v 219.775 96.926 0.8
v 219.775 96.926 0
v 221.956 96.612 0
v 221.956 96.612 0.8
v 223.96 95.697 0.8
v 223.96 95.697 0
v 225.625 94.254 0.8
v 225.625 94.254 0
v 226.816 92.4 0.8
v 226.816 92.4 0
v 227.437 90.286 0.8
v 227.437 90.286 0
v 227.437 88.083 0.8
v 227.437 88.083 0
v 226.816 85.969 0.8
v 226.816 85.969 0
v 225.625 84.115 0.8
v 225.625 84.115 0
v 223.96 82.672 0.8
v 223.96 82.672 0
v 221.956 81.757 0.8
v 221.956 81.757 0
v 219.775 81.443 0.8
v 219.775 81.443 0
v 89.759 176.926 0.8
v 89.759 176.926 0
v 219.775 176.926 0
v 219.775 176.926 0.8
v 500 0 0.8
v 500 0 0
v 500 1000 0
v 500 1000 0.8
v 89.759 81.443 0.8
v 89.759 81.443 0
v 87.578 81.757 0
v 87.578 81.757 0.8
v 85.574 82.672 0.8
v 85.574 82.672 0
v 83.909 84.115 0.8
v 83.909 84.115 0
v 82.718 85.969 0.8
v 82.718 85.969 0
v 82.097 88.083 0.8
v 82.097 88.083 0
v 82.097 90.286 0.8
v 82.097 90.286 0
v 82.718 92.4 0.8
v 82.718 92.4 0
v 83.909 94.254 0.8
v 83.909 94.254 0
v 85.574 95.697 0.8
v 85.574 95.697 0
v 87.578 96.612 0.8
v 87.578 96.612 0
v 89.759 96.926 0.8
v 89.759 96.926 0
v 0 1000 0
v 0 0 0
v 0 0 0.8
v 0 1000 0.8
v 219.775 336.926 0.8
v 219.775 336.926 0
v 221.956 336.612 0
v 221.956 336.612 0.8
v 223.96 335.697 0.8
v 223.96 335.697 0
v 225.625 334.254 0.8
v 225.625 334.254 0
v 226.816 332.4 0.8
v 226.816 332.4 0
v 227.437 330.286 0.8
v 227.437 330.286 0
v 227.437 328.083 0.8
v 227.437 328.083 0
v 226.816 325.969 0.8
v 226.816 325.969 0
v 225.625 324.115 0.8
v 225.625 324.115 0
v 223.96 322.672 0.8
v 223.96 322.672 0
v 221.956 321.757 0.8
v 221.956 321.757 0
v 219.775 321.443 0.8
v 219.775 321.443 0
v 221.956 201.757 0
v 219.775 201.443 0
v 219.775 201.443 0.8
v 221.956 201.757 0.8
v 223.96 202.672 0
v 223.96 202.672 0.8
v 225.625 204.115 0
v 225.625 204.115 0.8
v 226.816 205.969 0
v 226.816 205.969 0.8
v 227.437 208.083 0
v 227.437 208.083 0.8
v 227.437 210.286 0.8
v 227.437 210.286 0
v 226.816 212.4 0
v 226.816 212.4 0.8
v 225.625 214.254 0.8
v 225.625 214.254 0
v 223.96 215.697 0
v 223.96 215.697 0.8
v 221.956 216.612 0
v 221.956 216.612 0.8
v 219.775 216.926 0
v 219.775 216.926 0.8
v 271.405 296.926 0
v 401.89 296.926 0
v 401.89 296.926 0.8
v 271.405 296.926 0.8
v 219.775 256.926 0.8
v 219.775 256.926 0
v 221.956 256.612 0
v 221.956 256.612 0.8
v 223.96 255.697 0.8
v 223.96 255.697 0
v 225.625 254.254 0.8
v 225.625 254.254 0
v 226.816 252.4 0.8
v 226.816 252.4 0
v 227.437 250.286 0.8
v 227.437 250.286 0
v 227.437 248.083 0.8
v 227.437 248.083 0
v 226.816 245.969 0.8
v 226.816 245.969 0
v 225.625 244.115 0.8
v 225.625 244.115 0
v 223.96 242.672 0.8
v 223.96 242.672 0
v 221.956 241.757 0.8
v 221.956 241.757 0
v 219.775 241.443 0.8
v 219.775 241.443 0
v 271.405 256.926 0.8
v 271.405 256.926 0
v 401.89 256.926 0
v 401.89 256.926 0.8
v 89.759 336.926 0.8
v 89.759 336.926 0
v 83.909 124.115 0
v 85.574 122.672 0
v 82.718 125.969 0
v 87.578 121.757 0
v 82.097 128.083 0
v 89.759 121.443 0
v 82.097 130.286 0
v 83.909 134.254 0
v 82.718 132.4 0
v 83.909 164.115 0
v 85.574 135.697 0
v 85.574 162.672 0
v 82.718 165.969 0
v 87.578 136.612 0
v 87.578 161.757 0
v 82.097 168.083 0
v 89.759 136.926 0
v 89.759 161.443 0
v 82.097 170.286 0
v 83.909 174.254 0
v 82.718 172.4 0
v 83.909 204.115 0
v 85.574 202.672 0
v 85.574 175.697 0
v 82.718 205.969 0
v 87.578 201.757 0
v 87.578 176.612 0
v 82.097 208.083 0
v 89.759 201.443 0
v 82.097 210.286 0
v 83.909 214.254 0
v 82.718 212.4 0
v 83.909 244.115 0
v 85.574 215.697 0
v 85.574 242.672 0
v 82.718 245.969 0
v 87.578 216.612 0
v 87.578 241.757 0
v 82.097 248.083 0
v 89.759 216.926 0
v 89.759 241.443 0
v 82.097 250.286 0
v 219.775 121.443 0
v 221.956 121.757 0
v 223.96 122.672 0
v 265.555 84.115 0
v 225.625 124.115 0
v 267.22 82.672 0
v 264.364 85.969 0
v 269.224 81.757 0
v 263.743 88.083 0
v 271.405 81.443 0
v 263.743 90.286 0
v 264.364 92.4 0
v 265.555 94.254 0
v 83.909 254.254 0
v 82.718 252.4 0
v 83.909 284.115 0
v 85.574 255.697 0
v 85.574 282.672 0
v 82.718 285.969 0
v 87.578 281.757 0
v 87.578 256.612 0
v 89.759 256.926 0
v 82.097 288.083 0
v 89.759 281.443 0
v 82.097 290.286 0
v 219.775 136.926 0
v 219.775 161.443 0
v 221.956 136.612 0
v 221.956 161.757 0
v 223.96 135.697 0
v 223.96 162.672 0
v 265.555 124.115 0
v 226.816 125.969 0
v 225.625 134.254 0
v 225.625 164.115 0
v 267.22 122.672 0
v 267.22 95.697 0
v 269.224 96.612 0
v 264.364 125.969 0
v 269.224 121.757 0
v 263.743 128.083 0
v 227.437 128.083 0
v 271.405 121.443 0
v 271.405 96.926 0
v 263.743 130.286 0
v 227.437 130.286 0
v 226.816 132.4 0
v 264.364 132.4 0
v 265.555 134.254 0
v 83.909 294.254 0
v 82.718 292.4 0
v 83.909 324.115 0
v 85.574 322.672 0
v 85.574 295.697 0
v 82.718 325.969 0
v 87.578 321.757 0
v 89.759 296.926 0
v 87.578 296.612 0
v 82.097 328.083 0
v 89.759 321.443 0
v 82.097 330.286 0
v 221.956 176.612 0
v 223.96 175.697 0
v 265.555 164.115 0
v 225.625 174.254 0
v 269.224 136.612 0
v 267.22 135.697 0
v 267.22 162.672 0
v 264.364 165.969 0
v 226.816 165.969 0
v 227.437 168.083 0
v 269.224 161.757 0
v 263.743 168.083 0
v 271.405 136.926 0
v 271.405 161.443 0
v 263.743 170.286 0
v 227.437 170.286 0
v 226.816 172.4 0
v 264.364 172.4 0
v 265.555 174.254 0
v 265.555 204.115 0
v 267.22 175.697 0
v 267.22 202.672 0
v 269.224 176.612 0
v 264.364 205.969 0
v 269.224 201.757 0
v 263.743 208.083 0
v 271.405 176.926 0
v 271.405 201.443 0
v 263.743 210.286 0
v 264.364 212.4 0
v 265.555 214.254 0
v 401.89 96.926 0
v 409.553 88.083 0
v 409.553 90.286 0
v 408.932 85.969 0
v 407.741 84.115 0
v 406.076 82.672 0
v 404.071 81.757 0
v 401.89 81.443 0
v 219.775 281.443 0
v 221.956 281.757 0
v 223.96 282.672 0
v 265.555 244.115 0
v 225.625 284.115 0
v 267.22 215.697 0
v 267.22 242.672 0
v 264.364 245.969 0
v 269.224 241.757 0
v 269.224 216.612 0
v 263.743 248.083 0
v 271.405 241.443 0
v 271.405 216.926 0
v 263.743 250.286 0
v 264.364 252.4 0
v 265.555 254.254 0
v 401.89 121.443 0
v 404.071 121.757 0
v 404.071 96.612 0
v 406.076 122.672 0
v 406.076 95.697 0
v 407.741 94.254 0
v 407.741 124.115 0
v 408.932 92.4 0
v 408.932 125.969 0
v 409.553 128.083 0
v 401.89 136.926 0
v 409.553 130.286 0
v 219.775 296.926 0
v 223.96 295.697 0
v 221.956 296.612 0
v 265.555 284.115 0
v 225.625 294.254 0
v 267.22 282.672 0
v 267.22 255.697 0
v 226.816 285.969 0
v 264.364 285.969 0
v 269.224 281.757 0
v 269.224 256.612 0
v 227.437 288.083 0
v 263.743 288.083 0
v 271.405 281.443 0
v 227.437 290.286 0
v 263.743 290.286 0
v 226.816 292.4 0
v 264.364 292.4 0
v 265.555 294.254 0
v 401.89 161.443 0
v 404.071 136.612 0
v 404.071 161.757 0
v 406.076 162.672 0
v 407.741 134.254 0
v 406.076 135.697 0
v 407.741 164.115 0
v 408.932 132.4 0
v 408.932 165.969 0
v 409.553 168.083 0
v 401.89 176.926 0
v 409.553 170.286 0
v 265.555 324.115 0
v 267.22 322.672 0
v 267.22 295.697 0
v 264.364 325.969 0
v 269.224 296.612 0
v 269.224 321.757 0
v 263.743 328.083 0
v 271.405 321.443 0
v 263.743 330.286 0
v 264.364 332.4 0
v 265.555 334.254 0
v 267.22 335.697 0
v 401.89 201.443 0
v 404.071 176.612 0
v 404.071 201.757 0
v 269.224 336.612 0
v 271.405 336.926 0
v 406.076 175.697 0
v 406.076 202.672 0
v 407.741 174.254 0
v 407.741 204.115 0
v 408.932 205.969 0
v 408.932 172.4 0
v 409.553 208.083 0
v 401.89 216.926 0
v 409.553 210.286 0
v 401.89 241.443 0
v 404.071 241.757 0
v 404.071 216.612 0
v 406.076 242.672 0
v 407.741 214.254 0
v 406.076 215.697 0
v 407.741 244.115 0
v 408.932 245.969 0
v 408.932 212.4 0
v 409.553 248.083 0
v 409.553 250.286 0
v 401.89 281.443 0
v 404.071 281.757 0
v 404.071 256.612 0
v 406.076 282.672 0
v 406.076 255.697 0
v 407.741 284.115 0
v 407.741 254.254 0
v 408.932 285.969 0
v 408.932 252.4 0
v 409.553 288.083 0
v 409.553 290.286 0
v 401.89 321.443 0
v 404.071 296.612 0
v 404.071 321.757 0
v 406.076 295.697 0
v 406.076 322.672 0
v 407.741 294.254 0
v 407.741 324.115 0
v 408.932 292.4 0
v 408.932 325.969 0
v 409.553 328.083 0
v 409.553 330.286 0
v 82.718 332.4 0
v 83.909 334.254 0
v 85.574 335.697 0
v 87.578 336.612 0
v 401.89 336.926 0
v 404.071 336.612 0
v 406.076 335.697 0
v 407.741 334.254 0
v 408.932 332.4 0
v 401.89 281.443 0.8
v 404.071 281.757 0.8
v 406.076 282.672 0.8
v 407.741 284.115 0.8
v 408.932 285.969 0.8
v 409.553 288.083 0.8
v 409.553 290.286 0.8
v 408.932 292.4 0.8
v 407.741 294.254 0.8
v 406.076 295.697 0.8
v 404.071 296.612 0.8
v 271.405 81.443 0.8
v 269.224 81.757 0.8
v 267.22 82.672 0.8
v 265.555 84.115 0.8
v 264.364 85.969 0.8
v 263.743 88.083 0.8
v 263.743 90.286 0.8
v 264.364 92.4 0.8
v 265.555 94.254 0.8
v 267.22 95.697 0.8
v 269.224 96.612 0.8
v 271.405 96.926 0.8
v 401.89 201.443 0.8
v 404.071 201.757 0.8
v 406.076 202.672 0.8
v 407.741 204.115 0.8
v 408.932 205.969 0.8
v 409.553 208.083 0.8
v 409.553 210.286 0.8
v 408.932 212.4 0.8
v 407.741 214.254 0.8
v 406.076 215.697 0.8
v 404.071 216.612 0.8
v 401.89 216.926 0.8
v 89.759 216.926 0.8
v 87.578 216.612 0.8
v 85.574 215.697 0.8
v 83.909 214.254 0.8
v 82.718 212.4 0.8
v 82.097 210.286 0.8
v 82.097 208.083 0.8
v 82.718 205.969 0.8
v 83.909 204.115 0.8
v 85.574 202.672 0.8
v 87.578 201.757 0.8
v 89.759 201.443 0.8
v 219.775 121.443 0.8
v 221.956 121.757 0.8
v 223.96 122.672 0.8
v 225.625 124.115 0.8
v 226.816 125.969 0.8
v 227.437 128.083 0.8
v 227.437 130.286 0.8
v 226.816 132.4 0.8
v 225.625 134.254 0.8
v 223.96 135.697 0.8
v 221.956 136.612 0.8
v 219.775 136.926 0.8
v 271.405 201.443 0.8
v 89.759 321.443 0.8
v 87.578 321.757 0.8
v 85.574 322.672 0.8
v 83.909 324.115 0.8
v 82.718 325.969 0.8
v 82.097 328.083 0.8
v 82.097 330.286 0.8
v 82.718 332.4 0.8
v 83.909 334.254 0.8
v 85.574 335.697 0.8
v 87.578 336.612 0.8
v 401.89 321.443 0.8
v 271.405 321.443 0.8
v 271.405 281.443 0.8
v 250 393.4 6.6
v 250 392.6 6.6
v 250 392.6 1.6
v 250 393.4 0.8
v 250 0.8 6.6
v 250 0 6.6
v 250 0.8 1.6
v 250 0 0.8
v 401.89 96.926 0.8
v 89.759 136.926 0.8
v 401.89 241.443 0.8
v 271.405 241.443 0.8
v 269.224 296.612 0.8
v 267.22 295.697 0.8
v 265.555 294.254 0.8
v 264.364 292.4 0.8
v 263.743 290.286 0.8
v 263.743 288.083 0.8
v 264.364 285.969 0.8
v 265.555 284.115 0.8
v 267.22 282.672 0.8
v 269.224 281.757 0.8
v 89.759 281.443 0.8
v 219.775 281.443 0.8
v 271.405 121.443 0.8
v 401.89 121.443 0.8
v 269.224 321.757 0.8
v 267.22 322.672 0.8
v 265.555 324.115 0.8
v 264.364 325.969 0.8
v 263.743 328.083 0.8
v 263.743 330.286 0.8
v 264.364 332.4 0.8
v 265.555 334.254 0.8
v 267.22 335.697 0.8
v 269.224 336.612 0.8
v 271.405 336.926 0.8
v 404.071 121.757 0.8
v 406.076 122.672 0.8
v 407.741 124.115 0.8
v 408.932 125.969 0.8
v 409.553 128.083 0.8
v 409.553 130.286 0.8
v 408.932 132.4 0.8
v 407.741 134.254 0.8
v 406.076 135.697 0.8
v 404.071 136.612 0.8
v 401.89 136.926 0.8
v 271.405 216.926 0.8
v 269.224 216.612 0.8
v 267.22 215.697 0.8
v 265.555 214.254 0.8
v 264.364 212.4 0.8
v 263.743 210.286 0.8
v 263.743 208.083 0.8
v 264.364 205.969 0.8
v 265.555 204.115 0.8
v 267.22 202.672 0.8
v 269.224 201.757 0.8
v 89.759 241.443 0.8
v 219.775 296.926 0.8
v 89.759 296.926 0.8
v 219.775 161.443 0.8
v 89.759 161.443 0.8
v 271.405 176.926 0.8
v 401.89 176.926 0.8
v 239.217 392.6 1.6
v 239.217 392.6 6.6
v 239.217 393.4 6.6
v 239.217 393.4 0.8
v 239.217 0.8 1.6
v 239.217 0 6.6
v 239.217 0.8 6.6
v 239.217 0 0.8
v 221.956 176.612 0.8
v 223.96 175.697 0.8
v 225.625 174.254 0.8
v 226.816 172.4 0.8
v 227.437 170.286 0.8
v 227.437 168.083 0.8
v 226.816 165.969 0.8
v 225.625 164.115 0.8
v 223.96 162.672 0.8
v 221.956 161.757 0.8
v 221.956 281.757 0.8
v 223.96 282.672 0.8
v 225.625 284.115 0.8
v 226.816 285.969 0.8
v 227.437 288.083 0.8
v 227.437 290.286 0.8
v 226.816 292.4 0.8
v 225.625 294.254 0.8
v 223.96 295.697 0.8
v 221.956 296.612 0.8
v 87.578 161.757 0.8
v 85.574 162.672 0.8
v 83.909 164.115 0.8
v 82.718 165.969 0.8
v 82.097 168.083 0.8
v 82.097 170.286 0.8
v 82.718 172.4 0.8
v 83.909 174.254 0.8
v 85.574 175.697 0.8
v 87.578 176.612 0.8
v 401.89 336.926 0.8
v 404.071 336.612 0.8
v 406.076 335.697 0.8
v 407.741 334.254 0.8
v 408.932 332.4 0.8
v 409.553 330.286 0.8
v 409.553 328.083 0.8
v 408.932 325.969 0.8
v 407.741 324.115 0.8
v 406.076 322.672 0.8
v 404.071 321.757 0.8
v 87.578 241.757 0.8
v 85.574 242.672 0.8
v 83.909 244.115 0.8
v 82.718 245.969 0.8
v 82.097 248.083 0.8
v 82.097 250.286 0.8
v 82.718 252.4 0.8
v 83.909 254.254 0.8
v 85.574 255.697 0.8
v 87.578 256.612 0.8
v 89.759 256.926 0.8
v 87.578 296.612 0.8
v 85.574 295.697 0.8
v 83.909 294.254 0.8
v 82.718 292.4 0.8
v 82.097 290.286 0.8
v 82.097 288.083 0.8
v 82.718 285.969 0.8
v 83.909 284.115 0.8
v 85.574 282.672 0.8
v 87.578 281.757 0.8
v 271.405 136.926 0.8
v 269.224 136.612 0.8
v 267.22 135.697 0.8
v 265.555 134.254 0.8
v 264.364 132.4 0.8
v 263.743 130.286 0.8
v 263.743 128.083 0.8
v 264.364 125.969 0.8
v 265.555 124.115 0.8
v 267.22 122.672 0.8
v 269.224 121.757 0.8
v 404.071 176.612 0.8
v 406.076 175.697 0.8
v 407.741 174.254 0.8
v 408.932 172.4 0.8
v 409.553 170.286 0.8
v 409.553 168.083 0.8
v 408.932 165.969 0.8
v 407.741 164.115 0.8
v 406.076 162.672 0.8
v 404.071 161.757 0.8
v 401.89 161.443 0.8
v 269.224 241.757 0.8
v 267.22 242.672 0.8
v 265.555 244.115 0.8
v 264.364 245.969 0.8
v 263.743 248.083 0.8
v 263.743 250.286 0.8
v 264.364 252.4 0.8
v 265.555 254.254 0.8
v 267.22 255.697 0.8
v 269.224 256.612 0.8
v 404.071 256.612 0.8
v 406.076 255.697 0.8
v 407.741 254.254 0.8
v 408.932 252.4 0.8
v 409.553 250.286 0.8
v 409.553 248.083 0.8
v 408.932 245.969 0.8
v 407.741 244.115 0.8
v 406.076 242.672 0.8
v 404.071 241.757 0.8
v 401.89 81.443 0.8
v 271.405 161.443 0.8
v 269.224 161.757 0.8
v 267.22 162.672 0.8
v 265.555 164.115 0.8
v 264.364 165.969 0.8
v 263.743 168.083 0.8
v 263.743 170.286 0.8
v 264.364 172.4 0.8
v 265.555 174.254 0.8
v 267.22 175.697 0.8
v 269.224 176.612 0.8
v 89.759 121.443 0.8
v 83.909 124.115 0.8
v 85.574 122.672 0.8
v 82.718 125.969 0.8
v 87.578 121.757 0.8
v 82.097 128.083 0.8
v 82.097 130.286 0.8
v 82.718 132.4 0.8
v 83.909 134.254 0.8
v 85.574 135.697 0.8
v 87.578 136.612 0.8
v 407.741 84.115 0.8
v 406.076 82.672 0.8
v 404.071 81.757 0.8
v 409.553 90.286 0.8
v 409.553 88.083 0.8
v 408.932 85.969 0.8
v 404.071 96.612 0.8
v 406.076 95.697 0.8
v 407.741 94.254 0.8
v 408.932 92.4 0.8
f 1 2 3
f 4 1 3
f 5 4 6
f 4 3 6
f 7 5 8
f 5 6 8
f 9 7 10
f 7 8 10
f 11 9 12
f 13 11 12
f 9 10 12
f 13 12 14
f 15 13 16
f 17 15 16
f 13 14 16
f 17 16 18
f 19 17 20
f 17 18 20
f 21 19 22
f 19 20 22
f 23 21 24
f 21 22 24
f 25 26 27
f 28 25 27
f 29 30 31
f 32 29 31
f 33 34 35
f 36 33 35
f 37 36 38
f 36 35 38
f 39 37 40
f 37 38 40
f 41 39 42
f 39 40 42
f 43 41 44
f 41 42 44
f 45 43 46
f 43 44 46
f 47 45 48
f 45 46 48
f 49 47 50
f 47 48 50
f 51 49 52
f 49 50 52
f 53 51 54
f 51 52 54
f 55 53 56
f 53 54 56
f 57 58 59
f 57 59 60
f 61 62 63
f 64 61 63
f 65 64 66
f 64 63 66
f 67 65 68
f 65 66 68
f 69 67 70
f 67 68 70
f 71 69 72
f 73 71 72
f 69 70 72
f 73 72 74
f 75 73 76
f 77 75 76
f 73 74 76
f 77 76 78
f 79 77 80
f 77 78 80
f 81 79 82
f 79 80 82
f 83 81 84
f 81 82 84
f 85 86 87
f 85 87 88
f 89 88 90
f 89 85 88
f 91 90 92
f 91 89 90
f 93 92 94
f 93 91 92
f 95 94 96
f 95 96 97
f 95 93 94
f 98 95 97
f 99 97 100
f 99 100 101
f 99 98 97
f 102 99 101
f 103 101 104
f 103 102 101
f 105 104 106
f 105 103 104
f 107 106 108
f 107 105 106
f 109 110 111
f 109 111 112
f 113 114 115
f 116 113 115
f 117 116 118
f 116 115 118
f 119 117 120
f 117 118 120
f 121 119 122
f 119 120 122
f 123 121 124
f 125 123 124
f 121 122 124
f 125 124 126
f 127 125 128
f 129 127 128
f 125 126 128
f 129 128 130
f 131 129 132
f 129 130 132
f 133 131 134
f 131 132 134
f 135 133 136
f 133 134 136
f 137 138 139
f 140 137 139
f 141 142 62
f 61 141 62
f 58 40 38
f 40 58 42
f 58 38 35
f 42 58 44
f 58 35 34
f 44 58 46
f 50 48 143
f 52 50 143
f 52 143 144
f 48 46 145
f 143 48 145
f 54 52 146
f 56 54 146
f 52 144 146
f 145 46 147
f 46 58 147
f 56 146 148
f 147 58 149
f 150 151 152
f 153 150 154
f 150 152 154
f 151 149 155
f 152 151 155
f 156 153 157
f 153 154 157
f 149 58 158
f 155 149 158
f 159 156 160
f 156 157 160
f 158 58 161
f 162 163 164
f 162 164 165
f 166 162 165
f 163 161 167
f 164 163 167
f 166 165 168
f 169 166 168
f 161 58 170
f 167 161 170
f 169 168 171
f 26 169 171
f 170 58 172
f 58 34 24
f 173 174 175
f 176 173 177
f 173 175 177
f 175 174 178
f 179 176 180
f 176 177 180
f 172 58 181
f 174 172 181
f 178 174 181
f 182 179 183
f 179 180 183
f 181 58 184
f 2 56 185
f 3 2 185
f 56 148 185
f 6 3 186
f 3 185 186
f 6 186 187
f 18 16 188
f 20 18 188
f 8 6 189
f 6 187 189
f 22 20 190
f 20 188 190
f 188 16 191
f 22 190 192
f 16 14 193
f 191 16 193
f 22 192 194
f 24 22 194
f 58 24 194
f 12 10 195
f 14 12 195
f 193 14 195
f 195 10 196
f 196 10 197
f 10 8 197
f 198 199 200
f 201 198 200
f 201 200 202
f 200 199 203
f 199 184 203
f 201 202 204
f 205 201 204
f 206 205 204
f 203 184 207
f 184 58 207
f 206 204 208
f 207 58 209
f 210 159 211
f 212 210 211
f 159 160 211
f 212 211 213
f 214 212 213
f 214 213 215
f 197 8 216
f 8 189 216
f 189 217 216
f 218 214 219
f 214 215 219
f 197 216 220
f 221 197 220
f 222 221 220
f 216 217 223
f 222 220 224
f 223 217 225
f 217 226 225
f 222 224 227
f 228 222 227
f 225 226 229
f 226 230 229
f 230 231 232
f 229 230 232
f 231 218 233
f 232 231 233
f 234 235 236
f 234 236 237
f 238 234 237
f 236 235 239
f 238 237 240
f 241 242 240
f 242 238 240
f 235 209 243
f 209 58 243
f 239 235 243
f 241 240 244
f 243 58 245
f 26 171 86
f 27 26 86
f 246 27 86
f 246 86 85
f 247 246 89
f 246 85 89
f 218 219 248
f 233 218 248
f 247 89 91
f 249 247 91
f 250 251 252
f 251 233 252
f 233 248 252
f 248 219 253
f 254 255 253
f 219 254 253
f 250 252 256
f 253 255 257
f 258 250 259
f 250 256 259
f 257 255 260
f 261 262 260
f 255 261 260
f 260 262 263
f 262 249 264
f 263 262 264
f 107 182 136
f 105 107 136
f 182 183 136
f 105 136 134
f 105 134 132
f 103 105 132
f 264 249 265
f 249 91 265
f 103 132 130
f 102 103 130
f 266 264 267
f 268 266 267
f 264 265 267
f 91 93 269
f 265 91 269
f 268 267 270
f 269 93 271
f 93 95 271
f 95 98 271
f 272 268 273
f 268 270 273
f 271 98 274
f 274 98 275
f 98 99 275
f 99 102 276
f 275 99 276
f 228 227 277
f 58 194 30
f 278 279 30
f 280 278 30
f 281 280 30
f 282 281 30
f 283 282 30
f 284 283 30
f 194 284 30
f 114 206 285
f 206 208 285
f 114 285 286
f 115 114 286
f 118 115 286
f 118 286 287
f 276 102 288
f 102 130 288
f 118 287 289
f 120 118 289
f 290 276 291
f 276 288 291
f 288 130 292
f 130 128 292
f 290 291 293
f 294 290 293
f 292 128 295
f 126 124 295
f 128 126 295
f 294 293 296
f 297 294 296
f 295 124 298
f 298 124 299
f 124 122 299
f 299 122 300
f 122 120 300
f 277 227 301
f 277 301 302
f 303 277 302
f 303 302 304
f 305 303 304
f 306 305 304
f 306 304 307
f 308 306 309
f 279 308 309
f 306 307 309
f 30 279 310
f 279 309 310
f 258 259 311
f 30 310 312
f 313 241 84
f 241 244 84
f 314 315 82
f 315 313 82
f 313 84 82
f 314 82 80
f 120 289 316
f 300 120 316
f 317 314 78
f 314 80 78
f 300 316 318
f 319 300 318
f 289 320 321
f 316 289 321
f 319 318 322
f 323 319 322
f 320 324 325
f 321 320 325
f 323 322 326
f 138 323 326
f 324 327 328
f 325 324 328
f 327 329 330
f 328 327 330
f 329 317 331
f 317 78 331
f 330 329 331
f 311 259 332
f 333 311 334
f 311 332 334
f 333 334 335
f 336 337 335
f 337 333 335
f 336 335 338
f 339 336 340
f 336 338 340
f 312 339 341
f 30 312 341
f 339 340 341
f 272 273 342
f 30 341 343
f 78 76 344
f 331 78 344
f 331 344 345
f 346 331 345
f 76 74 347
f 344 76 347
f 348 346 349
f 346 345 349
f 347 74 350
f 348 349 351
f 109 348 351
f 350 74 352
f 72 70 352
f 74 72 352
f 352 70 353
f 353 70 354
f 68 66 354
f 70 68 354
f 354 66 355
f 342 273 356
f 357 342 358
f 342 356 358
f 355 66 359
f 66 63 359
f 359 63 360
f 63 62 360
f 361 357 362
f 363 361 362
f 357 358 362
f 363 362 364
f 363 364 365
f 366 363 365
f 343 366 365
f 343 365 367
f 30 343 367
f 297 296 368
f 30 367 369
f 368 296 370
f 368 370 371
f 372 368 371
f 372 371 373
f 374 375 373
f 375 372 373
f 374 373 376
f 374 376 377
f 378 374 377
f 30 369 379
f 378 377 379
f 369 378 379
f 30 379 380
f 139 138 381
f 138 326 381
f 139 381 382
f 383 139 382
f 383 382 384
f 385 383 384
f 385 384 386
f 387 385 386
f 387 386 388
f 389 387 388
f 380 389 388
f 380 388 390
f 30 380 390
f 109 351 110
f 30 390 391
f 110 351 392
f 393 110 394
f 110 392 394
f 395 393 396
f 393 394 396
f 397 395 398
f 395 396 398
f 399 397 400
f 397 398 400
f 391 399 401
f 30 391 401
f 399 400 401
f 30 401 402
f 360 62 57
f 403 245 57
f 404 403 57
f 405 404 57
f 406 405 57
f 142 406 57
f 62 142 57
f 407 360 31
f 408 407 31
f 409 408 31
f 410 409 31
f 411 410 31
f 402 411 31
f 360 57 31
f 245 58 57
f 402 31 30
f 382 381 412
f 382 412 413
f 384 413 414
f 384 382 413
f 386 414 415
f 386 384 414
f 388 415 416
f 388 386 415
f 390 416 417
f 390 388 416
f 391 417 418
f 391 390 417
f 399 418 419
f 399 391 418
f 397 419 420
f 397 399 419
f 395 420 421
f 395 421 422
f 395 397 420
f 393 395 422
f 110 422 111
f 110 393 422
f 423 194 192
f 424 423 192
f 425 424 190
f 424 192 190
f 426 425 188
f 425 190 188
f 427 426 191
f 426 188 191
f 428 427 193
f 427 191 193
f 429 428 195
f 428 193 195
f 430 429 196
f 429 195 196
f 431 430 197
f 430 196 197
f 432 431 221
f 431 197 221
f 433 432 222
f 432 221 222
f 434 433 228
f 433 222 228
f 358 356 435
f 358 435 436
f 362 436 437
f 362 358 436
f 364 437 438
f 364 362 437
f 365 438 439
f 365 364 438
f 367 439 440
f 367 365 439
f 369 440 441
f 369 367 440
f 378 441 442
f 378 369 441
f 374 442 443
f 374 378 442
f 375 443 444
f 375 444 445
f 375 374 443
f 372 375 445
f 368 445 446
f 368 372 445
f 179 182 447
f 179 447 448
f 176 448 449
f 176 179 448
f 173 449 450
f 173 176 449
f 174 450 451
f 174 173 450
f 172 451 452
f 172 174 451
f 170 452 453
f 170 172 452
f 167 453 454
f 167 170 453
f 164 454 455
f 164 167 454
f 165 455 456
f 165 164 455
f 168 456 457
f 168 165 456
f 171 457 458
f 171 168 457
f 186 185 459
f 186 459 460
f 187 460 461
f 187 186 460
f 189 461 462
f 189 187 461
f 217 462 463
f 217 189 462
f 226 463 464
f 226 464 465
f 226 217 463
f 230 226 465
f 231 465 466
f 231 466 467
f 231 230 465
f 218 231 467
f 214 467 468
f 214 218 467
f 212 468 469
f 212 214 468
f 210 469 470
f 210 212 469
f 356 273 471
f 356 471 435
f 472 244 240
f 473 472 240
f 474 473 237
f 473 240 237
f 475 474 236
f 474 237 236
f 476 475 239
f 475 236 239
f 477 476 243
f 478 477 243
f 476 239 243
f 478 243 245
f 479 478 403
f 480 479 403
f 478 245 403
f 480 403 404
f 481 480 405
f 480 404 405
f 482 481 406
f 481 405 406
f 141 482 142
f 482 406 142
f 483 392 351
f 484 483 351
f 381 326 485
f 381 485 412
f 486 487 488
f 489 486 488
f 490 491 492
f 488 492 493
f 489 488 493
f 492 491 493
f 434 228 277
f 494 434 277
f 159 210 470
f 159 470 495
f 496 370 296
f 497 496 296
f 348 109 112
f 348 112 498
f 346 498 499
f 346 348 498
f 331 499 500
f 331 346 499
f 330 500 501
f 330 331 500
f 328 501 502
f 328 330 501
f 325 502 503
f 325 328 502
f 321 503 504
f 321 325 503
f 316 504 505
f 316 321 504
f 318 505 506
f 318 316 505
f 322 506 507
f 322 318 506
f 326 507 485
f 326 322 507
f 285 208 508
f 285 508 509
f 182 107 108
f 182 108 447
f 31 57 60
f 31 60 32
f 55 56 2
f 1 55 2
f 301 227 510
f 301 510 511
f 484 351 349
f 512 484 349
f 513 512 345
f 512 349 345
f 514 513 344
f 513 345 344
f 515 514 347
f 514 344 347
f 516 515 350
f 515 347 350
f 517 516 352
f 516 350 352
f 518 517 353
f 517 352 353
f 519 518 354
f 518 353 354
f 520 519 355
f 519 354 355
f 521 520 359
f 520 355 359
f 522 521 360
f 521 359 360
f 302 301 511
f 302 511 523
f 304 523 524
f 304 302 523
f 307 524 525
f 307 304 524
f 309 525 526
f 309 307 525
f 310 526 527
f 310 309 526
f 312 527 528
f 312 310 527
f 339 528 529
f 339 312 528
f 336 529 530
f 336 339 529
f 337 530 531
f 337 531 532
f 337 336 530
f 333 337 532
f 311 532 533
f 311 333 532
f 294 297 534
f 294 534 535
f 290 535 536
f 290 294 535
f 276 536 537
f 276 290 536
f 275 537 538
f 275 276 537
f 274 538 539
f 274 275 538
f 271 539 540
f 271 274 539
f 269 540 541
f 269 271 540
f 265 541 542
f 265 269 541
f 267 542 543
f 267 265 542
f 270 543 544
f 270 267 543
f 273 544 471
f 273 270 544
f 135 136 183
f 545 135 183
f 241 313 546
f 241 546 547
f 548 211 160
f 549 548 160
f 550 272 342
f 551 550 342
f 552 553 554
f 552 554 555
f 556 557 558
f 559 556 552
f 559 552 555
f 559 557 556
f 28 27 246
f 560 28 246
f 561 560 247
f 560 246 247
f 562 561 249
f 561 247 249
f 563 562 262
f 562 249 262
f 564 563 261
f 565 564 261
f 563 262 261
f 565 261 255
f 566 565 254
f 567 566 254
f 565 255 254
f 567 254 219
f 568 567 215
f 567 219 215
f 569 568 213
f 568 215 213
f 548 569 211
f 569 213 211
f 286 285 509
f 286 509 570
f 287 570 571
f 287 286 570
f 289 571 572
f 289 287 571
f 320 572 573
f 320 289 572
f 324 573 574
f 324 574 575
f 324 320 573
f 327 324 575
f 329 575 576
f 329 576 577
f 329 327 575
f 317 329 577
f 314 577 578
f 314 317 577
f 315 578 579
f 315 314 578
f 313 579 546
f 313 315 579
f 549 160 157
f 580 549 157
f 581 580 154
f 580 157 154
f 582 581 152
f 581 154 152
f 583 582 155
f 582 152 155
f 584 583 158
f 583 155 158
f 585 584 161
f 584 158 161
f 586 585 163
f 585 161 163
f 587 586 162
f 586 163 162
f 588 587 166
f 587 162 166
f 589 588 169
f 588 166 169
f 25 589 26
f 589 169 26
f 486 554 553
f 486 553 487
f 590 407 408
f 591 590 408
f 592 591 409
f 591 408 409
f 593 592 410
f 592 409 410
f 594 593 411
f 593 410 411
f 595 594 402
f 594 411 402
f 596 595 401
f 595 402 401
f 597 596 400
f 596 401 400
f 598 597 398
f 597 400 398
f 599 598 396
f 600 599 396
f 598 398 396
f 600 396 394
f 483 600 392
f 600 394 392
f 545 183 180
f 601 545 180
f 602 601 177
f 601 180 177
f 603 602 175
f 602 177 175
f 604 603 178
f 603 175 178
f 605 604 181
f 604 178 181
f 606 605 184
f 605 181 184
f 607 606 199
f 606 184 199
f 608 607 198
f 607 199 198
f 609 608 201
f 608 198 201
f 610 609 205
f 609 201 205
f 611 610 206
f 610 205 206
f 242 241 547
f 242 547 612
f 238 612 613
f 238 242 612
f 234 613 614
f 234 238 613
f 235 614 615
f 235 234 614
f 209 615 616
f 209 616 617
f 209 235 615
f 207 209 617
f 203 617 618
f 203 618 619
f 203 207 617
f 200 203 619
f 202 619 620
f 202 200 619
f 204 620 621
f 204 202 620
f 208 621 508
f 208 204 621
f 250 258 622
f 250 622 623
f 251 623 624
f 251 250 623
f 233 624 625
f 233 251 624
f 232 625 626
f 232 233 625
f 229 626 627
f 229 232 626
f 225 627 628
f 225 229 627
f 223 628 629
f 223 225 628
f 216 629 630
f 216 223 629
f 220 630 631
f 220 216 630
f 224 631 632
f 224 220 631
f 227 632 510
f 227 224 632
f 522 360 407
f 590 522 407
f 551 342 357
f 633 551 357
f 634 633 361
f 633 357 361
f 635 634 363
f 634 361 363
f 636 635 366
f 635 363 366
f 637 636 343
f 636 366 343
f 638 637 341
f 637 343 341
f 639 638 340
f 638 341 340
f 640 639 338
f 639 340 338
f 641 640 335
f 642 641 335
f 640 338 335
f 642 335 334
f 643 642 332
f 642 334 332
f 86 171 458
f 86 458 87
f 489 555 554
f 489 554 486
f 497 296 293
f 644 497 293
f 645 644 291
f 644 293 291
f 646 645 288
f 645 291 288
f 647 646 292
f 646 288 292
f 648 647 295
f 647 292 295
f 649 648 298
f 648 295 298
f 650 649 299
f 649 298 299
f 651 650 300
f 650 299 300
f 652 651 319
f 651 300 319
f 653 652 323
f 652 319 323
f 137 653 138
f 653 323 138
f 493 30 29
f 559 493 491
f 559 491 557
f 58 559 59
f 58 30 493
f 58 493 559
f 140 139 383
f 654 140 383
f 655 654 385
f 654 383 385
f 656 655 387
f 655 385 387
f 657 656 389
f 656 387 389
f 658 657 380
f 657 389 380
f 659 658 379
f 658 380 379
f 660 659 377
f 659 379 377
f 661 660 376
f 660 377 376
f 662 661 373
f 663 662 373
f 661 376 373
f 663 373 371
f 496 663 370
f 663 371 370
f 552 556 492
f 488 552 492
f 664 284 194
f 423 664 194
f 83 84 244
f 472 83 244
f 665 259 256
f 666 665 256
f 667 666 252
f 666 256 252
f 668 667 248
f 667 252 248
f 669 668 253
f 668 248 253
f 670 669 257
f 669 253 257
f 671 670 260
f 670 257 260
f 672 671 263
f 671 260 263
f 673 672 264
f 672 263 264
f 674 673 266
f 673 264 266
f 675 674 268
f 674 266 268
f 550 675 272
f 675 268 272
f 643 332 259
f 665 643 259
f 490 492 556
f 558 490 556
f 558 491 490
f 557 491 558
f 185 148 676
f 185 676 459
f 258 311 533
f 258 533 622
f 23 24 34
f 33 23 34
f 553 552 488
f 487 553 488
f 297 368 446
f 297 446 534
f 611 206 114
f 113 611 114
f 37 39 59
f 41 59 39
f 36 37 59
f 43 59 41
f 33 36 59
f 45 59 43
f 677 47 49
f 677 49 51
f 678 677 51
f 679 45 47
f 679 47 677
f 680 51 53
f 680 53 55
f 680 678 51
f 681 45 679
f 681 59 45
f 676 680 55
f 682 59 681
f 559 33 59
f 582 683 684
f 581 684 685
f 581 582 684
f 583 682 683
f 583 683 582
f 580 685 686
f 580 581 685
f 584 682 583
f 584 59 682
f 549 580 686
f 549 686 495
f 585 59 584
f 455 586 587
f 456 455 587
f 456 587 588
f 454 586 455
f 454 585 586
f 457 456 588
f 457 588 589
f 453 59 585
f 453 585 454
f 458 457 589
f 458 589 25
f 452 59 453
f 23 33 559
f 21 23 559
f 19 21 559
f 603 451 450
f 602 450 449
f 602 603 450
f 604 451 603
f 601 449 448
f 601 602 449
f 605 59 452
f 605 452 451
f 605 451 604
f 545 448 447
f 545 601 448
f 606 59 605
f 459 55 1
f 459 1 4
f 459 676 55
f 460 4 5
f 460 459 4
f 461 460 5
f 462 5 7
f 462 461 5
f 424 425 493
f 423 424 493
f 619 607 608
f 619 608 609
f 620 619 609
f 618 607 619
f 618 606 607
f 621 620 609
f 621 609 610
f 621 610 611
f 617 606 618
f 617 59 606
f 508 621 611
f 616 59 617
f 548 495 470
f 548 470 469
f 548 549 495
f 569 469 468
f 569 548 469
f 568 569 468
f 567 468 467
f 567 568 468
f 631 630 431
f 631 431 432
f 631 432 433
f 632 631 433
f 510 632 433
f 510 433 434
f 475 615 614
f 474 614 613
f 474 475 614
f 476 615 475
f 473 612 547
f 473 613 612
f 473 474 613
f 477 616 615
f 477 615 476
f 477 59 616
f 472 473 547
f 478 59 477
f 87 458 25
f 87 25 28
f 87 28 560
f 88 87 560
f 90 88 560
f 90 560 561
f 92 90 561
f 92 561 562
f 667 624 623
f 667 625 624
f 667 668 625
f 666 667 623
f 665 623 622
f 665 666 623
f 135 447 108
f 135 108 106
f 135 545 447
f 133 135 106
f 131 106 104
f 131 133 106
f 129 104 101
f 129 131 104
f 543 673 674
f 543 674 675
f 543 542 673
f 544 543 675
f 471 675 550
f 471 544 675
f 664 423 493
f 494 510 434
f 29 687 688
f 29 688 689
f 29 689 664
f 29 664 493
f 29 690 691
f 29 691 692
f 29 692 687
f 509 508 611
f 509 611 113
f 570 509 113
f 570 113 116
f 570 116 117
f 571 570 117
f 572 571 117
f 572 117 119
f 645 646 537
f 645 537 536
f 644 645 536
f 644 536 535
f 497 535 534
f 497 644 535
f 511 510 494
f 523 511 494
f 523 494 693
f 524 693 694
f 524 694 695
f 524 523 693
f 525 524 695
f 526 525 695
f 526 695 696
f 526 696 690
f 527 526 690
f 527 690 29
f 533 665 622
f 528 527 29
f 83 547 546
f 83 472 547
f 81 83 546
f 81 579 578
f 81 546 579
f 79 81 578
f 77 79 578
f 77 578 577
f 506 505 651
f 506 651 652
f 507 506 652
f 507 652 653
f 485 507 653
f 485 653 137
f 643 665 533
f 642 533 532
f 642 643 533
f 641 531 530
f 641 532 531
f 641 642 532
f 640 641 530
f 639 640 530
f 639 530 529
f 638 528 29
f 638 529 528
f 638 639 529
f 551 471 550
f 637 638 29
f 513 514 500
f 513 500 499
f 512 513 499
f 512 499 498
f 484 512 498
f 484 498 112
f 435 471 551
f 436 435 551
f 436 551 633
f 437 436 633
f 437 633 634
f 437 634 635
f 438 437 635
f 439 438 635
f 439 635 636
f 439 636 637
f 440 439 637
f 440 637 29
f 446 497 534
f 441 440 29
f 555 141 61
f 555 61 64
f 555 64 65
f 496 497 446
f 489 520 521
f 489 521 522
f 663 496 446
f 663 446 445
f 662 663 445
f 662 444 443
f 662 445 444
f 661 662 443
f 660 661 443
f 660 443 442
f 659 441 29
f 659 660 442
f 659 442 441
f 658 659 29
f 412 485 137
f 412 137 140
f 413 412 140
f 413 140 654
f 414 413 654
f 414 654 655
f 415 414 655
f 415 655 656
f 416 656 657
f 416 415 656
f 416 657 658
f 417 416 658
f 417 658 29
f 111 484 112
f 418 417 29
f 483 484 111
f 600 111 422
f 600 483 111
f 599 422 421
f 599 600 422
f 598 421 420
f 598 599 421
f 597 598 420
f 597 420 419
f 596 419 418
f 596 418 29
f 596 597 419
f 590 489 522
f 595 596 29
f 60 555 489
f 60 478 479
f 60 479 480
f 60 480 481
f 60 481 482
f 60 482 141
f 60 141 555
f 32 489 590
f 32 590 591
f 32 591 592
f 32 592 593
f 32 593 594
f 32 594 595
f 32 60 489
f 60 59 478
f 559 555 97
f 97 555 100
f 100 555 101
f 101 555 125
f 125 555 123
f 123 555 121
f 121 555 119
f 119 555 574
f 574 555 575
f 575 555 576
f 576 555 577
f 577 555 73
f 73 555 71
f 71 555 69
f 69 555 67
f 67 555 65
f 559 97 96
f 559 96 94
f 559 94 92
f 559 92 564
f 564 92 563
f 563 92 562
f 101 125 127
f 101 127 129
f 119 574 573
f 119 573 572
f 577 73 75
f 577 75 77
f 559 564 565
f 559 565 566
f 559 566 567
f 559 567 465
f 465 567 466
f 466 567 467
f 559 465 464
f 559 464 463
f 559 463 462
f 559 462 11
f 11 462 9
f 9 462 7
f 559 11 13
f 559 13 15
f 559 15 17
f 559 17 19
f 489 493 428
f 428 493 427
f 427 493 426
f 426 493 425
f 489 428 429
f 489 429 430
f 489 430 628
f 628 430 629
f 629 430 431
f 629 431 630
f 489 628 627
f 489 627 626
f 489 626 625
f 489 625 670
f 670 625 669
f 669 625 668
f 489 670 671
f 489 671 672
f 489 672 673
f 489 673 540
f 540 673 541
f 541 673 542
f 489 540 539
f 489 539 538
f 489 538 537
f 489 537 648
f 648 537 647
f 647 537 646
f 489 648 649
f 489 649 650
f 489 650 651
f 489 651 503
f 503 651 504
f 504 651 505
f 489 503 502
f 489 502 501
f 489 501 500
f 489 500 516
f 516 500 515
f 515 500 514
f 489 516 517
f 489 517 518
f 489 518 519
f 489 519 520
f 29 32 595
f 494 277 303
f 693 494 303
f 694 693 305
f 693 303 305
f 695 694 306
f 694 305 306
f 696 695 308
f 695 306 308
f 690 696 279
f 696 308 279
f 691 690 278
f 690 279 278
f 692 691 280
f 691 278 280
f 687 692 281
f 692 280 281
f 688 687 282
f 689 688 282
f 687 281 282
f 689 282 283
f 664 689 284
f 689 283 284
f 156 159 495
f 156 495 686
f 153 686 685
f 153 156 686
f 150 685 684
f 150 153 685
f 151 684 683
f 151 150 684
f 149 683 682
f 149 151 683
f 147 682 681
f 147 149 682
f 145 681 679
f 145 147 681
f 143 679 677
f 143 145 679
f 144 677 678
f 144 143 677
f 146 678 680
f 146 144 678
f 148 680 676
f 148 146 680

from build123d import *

# Parameters (mm, degrees)
SKETCH1_W           = 500
SKETCH1_H           = 1000
BOSS_EXTRUDE1_DEPTH = 0.8
SKETCH4_W           = 10.782807929
SKETCH4_H           = 393.4
BOSS_EXTRUDE3_DEPTH = 0.8
SKETCH6_W           = 10.782807929
SKETCH6_H           = 5
BOSS_EXTRUDE4_DEPTH = 0.8
SKETCH7_W           = 10.782807929
SKETCH7_H           = 5
BOSS_EXTRUDE5_DEPTH = 0.8


with BuildPart() as part:
    # Sketch1 → Boss-Extrude1 (new body)
    with BuildSketch(Plane.XY):
        with Locations((250, 500)):
            Rectangle(SKETCH1_W, SKETCH1_H)
        with BuildLine():
            Line((89.759227751, 336.925516305), (219.774729178, 336.925516305))
            ThreePointArc((219.774729178, 336.925516305), (227.515924038, 329.184321446), (219.774729178, 321.443126586))
            Line((219.774729178, 321.443126586), (89.759227751, 321.443126586))
            ThreePointArc((89.759227751, 321.443126586), (82.018032891, 329.184321446), (89.759227751, 336.925516305))
        make_face(mode=Mode.SUBTRACT)
        with BuildLine():
            Line((271.405433716, 336.925516305), (401.890305185, 336.925516305))
            ThreePointArc((401.890305185, 336.925516305), (409.631500044, 329.184321446), (401.890305185, 321.443126586))
            Line((401.890305185, 321.443126586), (271.405433716, 321.443126586))
            ThreePointArc((271.405433716, 321.443126586), (263.664238856, 329.184321446), (271.405433716, 336.925516305))
        make_face(mode=Mode.SUBTRACT)
        with BuildLine():
            Line((271.405433716, 281.443126586), (401.890305185, 281.443126586))
            ThreePointArc((401.890305185, 281.443126586), (409.631500044, 289.184321446), (401.890305185, 296.925516305))
            Line((401.890305185, 296.925516305), (271.405433716, 296.925516305))
            ThreePointArc((271.405433716, 296.925516305), (263.664238856, 289.184321446), (271.405433716, 281.443126586))
        make_face(mode=Mode.SUBTRACT)
        with BuildLine():
            Line((89.759227751, 281.443126586), (219.774729178, 281.443126586))
            ThreePointArc((219.774729178, 281.443126586), (227.515924038, 289.184321446), (219.774729178, 296.925516305))
            Line((219.774729178, 296.925516305), (89.759227751, 296.925516305))
            ThreePointArc((89.759227751, 296.925516305), (82.018032891, 289.184321446), (89.759227751, 281.443126586))
        make_face(mode=Mode.SUBTRACT)
        with BuildLine():
            Line((271.405433716, 256.925516305), (401.890305185, 256.925516305))
            ThreePointArc((401.890305185, 256.925516305), (409.631500044, 249.184321446), (401.890305185, 241.443126586))
            Line((401.890305185, 241.443126586), (271.405433716, 241.443126586))
            ThreePointArc((271.405433716, 241.443126586), (263.664238856, 249.184321446), (271.405433716, 256.925516305))
        make_face(mode=Mode.SUBTRACT)
        with BuildLine():
            Line((271.405433716, 201.443126586), (401.890305185, 201.443126586))
            ThreePointArc((401.890305185, 201.443126586), (409.631500044, 209.184321446), (401.890305185, 216.925516305))
            Line((401.890305185, 216.925516305), (271.405433716, 216.925516305))
            ThreePointArc((271.405433716, 216.925516305), (263.664238856, 209.184321446), (271.405433716, 201.443126586))
        make_face(mode=Mode.SUBTRACT)
        with BuildLine():
            Line((89.759227751, 256.925516305), (219.774729178, 256.925516305))
            ThreePointArc((219.774729178, 256.925516305), (227.515924038, 249.184321446), (219.774729178, 241.443126586))
            Line((219.774729178, 241.443126586), (89.759227751, 241.443126586))
            ThreePointArc((89.759227751, 241.443126586), (82.018032891, 249.184321446), (89.759227751, 256.925516305))
        make_face(mode=Mode.SUBTRACT)
        with BuildLine():
            Line((89.759227751, 201.443126586), (219.774729178, 201.443126586))
            ThreePointArc((219.774729178, 201.443126586), (227.515924038, 209.184321446), (219.774729178, 216.925516305))
            Line((219.774729178, 216.925516305), (89.759227751, 216.925516305))
            ThreePointArc((89.759227751, 216.925516305), (82.018032891, 209.184321446), (89.759227751, 201.443126586))
        make_face(mode=Mode.SUBTRACT)
        with BuildLine():
            Line((271.405433716, 176.925516305), (401.890305185, 176.925516305))
            ThreePointArc((401.890305185, 176.925516305), (409.631500044, 169.184321446), (401.890305185, 161.443126586))
            Line((401.890305185, 161.443126586), (271.405433716, 161.443126586))
            ThreePointArc((271.405433716, 161.443126586), (263.664238856, 169.184321446), (271.405433716, 176.925516305))
        make_face(mode=Mode.SUBTRACT)
        with BuildLine():
            Line((89.759227751, 176.925516305), (219.774729178, 176.925516305))
            ThreePointArc((219.774729178, 176.925516305), (227.515924038, 169.184321446), (219.774729178, 161.443126586))
            Line((219.774729178, 161.443126586), (89.759227751, 161.443126586))
            ThreePointArc((89.759227751, 161.443126586), (82.018032891, 169.184321446), (89.759227751, 176.925516305))
        make_face(mode=Mode.SUBTRACT)
        with BuildLine():
            Line((89.759227751, 121.443126586), (219.774729178, 121.443126586))
            ThreePointArc((219.774729178, 121.443126586), (227.515924038, 129.184321446), (219.774729178, 136.925516305))
            Line((219.774729178, 136.925516305), (89.759227751, 136.925516305))
            ThreePointArc((89.759227751, 136.925516305), (82.018032891, 129.184321446), (89.759227751, 121.443126586))
        make_face(mode=Mode.SUBTRACT)
        with BuildLine():
            Line((271.405433716, 121.443126586), (401.890305185, 121.443126586))
            ThreePointArc((401.890305185, 121.443126586), (409.631500044, 129.184321446), (401.890305185, 136.925516305))
            Line((401.890305185, 136.925516305), (271.405433716, 136.925516305))
            ThreePointArc((271.405433716, 136.925516305), (263.664238856, 129.184321446), (271.405433716, 121.443126586))
        make_face(mode=Mode.SUBTRACT)
        with BuildLine():
            Line((271.405433716, 96.925516305), (401.890305185, 96.925516305))
            ThreePointArc((401.890305185, 96.925516305), (409.631500044, 89.184321446), (401.890305185, 81.443126586))
            Line((401.890305185, 81.443126586), (271.405433716, 81.443126586))
            ThreePointArc((271.405433716, 81.443126586), (263.664238856, 89.184321446), (271.405433716, 96.925516305))
        make_face(mode=Mode.SUBTRACT)
        with BuildLine():
            Line((89.759227751, 96.925516305), (219.774729178, 96.925516305))
            ThreePointArc((219.774729178, 96.925516305), (227.515924038, 89.184321446), (219.774729178, 81.443126586))
            Line((219.774729178, 81.443126586), (89.759227751, 81.443126586))
            ThreePointArc((89.759227751, 81.443126586), (82.018032891, 89.184321446), (89.759227751, 96.925516305))
        make_face(mode=Mode.SUBTRACT)
    extrude(amount=BOSS_EXTRUDE1_DEPTH)

    # Sketch4 → Boss-Extrude3 (add)
    with BuildSketch(Plane.XY.offset(0.8)):
        with Locations((244.608596036, 196.7)):
            Rectangle(SKETCH4_W, SKETCH4_H)
    extrude(amount=BOSS_EXTRUDE3_DEPTH)

    # Sketch6 → Boss-Extrude4 (add)
    with BuildSketch(Plane(origin=(0, 393.4, 0), x_dir=(1, 0, 0), z_dir=(0, 1, 0))):
        with Locations((244.608596036, -4.1)):
            Rectangle(SKETCH6_W, SKETCH6_H)
    extrude(amount=-BOSS_EXTRUDE4_DEPTH)

    # Sketch7 → Boss-Extrude5 (add)
    with BuildSketch(Plane(origin=(0, 0, 0), x_dir=(-1, 0, 0), z_dir=(0, -1, 0))):
        with Locations((-244.608596036, -4.1)):
            Rectangle(SKETCH7_W, SKETCH7_H)
    extrude(amount=-BOSS_EXTRUDE5_DEPTH)


solid = part.part
